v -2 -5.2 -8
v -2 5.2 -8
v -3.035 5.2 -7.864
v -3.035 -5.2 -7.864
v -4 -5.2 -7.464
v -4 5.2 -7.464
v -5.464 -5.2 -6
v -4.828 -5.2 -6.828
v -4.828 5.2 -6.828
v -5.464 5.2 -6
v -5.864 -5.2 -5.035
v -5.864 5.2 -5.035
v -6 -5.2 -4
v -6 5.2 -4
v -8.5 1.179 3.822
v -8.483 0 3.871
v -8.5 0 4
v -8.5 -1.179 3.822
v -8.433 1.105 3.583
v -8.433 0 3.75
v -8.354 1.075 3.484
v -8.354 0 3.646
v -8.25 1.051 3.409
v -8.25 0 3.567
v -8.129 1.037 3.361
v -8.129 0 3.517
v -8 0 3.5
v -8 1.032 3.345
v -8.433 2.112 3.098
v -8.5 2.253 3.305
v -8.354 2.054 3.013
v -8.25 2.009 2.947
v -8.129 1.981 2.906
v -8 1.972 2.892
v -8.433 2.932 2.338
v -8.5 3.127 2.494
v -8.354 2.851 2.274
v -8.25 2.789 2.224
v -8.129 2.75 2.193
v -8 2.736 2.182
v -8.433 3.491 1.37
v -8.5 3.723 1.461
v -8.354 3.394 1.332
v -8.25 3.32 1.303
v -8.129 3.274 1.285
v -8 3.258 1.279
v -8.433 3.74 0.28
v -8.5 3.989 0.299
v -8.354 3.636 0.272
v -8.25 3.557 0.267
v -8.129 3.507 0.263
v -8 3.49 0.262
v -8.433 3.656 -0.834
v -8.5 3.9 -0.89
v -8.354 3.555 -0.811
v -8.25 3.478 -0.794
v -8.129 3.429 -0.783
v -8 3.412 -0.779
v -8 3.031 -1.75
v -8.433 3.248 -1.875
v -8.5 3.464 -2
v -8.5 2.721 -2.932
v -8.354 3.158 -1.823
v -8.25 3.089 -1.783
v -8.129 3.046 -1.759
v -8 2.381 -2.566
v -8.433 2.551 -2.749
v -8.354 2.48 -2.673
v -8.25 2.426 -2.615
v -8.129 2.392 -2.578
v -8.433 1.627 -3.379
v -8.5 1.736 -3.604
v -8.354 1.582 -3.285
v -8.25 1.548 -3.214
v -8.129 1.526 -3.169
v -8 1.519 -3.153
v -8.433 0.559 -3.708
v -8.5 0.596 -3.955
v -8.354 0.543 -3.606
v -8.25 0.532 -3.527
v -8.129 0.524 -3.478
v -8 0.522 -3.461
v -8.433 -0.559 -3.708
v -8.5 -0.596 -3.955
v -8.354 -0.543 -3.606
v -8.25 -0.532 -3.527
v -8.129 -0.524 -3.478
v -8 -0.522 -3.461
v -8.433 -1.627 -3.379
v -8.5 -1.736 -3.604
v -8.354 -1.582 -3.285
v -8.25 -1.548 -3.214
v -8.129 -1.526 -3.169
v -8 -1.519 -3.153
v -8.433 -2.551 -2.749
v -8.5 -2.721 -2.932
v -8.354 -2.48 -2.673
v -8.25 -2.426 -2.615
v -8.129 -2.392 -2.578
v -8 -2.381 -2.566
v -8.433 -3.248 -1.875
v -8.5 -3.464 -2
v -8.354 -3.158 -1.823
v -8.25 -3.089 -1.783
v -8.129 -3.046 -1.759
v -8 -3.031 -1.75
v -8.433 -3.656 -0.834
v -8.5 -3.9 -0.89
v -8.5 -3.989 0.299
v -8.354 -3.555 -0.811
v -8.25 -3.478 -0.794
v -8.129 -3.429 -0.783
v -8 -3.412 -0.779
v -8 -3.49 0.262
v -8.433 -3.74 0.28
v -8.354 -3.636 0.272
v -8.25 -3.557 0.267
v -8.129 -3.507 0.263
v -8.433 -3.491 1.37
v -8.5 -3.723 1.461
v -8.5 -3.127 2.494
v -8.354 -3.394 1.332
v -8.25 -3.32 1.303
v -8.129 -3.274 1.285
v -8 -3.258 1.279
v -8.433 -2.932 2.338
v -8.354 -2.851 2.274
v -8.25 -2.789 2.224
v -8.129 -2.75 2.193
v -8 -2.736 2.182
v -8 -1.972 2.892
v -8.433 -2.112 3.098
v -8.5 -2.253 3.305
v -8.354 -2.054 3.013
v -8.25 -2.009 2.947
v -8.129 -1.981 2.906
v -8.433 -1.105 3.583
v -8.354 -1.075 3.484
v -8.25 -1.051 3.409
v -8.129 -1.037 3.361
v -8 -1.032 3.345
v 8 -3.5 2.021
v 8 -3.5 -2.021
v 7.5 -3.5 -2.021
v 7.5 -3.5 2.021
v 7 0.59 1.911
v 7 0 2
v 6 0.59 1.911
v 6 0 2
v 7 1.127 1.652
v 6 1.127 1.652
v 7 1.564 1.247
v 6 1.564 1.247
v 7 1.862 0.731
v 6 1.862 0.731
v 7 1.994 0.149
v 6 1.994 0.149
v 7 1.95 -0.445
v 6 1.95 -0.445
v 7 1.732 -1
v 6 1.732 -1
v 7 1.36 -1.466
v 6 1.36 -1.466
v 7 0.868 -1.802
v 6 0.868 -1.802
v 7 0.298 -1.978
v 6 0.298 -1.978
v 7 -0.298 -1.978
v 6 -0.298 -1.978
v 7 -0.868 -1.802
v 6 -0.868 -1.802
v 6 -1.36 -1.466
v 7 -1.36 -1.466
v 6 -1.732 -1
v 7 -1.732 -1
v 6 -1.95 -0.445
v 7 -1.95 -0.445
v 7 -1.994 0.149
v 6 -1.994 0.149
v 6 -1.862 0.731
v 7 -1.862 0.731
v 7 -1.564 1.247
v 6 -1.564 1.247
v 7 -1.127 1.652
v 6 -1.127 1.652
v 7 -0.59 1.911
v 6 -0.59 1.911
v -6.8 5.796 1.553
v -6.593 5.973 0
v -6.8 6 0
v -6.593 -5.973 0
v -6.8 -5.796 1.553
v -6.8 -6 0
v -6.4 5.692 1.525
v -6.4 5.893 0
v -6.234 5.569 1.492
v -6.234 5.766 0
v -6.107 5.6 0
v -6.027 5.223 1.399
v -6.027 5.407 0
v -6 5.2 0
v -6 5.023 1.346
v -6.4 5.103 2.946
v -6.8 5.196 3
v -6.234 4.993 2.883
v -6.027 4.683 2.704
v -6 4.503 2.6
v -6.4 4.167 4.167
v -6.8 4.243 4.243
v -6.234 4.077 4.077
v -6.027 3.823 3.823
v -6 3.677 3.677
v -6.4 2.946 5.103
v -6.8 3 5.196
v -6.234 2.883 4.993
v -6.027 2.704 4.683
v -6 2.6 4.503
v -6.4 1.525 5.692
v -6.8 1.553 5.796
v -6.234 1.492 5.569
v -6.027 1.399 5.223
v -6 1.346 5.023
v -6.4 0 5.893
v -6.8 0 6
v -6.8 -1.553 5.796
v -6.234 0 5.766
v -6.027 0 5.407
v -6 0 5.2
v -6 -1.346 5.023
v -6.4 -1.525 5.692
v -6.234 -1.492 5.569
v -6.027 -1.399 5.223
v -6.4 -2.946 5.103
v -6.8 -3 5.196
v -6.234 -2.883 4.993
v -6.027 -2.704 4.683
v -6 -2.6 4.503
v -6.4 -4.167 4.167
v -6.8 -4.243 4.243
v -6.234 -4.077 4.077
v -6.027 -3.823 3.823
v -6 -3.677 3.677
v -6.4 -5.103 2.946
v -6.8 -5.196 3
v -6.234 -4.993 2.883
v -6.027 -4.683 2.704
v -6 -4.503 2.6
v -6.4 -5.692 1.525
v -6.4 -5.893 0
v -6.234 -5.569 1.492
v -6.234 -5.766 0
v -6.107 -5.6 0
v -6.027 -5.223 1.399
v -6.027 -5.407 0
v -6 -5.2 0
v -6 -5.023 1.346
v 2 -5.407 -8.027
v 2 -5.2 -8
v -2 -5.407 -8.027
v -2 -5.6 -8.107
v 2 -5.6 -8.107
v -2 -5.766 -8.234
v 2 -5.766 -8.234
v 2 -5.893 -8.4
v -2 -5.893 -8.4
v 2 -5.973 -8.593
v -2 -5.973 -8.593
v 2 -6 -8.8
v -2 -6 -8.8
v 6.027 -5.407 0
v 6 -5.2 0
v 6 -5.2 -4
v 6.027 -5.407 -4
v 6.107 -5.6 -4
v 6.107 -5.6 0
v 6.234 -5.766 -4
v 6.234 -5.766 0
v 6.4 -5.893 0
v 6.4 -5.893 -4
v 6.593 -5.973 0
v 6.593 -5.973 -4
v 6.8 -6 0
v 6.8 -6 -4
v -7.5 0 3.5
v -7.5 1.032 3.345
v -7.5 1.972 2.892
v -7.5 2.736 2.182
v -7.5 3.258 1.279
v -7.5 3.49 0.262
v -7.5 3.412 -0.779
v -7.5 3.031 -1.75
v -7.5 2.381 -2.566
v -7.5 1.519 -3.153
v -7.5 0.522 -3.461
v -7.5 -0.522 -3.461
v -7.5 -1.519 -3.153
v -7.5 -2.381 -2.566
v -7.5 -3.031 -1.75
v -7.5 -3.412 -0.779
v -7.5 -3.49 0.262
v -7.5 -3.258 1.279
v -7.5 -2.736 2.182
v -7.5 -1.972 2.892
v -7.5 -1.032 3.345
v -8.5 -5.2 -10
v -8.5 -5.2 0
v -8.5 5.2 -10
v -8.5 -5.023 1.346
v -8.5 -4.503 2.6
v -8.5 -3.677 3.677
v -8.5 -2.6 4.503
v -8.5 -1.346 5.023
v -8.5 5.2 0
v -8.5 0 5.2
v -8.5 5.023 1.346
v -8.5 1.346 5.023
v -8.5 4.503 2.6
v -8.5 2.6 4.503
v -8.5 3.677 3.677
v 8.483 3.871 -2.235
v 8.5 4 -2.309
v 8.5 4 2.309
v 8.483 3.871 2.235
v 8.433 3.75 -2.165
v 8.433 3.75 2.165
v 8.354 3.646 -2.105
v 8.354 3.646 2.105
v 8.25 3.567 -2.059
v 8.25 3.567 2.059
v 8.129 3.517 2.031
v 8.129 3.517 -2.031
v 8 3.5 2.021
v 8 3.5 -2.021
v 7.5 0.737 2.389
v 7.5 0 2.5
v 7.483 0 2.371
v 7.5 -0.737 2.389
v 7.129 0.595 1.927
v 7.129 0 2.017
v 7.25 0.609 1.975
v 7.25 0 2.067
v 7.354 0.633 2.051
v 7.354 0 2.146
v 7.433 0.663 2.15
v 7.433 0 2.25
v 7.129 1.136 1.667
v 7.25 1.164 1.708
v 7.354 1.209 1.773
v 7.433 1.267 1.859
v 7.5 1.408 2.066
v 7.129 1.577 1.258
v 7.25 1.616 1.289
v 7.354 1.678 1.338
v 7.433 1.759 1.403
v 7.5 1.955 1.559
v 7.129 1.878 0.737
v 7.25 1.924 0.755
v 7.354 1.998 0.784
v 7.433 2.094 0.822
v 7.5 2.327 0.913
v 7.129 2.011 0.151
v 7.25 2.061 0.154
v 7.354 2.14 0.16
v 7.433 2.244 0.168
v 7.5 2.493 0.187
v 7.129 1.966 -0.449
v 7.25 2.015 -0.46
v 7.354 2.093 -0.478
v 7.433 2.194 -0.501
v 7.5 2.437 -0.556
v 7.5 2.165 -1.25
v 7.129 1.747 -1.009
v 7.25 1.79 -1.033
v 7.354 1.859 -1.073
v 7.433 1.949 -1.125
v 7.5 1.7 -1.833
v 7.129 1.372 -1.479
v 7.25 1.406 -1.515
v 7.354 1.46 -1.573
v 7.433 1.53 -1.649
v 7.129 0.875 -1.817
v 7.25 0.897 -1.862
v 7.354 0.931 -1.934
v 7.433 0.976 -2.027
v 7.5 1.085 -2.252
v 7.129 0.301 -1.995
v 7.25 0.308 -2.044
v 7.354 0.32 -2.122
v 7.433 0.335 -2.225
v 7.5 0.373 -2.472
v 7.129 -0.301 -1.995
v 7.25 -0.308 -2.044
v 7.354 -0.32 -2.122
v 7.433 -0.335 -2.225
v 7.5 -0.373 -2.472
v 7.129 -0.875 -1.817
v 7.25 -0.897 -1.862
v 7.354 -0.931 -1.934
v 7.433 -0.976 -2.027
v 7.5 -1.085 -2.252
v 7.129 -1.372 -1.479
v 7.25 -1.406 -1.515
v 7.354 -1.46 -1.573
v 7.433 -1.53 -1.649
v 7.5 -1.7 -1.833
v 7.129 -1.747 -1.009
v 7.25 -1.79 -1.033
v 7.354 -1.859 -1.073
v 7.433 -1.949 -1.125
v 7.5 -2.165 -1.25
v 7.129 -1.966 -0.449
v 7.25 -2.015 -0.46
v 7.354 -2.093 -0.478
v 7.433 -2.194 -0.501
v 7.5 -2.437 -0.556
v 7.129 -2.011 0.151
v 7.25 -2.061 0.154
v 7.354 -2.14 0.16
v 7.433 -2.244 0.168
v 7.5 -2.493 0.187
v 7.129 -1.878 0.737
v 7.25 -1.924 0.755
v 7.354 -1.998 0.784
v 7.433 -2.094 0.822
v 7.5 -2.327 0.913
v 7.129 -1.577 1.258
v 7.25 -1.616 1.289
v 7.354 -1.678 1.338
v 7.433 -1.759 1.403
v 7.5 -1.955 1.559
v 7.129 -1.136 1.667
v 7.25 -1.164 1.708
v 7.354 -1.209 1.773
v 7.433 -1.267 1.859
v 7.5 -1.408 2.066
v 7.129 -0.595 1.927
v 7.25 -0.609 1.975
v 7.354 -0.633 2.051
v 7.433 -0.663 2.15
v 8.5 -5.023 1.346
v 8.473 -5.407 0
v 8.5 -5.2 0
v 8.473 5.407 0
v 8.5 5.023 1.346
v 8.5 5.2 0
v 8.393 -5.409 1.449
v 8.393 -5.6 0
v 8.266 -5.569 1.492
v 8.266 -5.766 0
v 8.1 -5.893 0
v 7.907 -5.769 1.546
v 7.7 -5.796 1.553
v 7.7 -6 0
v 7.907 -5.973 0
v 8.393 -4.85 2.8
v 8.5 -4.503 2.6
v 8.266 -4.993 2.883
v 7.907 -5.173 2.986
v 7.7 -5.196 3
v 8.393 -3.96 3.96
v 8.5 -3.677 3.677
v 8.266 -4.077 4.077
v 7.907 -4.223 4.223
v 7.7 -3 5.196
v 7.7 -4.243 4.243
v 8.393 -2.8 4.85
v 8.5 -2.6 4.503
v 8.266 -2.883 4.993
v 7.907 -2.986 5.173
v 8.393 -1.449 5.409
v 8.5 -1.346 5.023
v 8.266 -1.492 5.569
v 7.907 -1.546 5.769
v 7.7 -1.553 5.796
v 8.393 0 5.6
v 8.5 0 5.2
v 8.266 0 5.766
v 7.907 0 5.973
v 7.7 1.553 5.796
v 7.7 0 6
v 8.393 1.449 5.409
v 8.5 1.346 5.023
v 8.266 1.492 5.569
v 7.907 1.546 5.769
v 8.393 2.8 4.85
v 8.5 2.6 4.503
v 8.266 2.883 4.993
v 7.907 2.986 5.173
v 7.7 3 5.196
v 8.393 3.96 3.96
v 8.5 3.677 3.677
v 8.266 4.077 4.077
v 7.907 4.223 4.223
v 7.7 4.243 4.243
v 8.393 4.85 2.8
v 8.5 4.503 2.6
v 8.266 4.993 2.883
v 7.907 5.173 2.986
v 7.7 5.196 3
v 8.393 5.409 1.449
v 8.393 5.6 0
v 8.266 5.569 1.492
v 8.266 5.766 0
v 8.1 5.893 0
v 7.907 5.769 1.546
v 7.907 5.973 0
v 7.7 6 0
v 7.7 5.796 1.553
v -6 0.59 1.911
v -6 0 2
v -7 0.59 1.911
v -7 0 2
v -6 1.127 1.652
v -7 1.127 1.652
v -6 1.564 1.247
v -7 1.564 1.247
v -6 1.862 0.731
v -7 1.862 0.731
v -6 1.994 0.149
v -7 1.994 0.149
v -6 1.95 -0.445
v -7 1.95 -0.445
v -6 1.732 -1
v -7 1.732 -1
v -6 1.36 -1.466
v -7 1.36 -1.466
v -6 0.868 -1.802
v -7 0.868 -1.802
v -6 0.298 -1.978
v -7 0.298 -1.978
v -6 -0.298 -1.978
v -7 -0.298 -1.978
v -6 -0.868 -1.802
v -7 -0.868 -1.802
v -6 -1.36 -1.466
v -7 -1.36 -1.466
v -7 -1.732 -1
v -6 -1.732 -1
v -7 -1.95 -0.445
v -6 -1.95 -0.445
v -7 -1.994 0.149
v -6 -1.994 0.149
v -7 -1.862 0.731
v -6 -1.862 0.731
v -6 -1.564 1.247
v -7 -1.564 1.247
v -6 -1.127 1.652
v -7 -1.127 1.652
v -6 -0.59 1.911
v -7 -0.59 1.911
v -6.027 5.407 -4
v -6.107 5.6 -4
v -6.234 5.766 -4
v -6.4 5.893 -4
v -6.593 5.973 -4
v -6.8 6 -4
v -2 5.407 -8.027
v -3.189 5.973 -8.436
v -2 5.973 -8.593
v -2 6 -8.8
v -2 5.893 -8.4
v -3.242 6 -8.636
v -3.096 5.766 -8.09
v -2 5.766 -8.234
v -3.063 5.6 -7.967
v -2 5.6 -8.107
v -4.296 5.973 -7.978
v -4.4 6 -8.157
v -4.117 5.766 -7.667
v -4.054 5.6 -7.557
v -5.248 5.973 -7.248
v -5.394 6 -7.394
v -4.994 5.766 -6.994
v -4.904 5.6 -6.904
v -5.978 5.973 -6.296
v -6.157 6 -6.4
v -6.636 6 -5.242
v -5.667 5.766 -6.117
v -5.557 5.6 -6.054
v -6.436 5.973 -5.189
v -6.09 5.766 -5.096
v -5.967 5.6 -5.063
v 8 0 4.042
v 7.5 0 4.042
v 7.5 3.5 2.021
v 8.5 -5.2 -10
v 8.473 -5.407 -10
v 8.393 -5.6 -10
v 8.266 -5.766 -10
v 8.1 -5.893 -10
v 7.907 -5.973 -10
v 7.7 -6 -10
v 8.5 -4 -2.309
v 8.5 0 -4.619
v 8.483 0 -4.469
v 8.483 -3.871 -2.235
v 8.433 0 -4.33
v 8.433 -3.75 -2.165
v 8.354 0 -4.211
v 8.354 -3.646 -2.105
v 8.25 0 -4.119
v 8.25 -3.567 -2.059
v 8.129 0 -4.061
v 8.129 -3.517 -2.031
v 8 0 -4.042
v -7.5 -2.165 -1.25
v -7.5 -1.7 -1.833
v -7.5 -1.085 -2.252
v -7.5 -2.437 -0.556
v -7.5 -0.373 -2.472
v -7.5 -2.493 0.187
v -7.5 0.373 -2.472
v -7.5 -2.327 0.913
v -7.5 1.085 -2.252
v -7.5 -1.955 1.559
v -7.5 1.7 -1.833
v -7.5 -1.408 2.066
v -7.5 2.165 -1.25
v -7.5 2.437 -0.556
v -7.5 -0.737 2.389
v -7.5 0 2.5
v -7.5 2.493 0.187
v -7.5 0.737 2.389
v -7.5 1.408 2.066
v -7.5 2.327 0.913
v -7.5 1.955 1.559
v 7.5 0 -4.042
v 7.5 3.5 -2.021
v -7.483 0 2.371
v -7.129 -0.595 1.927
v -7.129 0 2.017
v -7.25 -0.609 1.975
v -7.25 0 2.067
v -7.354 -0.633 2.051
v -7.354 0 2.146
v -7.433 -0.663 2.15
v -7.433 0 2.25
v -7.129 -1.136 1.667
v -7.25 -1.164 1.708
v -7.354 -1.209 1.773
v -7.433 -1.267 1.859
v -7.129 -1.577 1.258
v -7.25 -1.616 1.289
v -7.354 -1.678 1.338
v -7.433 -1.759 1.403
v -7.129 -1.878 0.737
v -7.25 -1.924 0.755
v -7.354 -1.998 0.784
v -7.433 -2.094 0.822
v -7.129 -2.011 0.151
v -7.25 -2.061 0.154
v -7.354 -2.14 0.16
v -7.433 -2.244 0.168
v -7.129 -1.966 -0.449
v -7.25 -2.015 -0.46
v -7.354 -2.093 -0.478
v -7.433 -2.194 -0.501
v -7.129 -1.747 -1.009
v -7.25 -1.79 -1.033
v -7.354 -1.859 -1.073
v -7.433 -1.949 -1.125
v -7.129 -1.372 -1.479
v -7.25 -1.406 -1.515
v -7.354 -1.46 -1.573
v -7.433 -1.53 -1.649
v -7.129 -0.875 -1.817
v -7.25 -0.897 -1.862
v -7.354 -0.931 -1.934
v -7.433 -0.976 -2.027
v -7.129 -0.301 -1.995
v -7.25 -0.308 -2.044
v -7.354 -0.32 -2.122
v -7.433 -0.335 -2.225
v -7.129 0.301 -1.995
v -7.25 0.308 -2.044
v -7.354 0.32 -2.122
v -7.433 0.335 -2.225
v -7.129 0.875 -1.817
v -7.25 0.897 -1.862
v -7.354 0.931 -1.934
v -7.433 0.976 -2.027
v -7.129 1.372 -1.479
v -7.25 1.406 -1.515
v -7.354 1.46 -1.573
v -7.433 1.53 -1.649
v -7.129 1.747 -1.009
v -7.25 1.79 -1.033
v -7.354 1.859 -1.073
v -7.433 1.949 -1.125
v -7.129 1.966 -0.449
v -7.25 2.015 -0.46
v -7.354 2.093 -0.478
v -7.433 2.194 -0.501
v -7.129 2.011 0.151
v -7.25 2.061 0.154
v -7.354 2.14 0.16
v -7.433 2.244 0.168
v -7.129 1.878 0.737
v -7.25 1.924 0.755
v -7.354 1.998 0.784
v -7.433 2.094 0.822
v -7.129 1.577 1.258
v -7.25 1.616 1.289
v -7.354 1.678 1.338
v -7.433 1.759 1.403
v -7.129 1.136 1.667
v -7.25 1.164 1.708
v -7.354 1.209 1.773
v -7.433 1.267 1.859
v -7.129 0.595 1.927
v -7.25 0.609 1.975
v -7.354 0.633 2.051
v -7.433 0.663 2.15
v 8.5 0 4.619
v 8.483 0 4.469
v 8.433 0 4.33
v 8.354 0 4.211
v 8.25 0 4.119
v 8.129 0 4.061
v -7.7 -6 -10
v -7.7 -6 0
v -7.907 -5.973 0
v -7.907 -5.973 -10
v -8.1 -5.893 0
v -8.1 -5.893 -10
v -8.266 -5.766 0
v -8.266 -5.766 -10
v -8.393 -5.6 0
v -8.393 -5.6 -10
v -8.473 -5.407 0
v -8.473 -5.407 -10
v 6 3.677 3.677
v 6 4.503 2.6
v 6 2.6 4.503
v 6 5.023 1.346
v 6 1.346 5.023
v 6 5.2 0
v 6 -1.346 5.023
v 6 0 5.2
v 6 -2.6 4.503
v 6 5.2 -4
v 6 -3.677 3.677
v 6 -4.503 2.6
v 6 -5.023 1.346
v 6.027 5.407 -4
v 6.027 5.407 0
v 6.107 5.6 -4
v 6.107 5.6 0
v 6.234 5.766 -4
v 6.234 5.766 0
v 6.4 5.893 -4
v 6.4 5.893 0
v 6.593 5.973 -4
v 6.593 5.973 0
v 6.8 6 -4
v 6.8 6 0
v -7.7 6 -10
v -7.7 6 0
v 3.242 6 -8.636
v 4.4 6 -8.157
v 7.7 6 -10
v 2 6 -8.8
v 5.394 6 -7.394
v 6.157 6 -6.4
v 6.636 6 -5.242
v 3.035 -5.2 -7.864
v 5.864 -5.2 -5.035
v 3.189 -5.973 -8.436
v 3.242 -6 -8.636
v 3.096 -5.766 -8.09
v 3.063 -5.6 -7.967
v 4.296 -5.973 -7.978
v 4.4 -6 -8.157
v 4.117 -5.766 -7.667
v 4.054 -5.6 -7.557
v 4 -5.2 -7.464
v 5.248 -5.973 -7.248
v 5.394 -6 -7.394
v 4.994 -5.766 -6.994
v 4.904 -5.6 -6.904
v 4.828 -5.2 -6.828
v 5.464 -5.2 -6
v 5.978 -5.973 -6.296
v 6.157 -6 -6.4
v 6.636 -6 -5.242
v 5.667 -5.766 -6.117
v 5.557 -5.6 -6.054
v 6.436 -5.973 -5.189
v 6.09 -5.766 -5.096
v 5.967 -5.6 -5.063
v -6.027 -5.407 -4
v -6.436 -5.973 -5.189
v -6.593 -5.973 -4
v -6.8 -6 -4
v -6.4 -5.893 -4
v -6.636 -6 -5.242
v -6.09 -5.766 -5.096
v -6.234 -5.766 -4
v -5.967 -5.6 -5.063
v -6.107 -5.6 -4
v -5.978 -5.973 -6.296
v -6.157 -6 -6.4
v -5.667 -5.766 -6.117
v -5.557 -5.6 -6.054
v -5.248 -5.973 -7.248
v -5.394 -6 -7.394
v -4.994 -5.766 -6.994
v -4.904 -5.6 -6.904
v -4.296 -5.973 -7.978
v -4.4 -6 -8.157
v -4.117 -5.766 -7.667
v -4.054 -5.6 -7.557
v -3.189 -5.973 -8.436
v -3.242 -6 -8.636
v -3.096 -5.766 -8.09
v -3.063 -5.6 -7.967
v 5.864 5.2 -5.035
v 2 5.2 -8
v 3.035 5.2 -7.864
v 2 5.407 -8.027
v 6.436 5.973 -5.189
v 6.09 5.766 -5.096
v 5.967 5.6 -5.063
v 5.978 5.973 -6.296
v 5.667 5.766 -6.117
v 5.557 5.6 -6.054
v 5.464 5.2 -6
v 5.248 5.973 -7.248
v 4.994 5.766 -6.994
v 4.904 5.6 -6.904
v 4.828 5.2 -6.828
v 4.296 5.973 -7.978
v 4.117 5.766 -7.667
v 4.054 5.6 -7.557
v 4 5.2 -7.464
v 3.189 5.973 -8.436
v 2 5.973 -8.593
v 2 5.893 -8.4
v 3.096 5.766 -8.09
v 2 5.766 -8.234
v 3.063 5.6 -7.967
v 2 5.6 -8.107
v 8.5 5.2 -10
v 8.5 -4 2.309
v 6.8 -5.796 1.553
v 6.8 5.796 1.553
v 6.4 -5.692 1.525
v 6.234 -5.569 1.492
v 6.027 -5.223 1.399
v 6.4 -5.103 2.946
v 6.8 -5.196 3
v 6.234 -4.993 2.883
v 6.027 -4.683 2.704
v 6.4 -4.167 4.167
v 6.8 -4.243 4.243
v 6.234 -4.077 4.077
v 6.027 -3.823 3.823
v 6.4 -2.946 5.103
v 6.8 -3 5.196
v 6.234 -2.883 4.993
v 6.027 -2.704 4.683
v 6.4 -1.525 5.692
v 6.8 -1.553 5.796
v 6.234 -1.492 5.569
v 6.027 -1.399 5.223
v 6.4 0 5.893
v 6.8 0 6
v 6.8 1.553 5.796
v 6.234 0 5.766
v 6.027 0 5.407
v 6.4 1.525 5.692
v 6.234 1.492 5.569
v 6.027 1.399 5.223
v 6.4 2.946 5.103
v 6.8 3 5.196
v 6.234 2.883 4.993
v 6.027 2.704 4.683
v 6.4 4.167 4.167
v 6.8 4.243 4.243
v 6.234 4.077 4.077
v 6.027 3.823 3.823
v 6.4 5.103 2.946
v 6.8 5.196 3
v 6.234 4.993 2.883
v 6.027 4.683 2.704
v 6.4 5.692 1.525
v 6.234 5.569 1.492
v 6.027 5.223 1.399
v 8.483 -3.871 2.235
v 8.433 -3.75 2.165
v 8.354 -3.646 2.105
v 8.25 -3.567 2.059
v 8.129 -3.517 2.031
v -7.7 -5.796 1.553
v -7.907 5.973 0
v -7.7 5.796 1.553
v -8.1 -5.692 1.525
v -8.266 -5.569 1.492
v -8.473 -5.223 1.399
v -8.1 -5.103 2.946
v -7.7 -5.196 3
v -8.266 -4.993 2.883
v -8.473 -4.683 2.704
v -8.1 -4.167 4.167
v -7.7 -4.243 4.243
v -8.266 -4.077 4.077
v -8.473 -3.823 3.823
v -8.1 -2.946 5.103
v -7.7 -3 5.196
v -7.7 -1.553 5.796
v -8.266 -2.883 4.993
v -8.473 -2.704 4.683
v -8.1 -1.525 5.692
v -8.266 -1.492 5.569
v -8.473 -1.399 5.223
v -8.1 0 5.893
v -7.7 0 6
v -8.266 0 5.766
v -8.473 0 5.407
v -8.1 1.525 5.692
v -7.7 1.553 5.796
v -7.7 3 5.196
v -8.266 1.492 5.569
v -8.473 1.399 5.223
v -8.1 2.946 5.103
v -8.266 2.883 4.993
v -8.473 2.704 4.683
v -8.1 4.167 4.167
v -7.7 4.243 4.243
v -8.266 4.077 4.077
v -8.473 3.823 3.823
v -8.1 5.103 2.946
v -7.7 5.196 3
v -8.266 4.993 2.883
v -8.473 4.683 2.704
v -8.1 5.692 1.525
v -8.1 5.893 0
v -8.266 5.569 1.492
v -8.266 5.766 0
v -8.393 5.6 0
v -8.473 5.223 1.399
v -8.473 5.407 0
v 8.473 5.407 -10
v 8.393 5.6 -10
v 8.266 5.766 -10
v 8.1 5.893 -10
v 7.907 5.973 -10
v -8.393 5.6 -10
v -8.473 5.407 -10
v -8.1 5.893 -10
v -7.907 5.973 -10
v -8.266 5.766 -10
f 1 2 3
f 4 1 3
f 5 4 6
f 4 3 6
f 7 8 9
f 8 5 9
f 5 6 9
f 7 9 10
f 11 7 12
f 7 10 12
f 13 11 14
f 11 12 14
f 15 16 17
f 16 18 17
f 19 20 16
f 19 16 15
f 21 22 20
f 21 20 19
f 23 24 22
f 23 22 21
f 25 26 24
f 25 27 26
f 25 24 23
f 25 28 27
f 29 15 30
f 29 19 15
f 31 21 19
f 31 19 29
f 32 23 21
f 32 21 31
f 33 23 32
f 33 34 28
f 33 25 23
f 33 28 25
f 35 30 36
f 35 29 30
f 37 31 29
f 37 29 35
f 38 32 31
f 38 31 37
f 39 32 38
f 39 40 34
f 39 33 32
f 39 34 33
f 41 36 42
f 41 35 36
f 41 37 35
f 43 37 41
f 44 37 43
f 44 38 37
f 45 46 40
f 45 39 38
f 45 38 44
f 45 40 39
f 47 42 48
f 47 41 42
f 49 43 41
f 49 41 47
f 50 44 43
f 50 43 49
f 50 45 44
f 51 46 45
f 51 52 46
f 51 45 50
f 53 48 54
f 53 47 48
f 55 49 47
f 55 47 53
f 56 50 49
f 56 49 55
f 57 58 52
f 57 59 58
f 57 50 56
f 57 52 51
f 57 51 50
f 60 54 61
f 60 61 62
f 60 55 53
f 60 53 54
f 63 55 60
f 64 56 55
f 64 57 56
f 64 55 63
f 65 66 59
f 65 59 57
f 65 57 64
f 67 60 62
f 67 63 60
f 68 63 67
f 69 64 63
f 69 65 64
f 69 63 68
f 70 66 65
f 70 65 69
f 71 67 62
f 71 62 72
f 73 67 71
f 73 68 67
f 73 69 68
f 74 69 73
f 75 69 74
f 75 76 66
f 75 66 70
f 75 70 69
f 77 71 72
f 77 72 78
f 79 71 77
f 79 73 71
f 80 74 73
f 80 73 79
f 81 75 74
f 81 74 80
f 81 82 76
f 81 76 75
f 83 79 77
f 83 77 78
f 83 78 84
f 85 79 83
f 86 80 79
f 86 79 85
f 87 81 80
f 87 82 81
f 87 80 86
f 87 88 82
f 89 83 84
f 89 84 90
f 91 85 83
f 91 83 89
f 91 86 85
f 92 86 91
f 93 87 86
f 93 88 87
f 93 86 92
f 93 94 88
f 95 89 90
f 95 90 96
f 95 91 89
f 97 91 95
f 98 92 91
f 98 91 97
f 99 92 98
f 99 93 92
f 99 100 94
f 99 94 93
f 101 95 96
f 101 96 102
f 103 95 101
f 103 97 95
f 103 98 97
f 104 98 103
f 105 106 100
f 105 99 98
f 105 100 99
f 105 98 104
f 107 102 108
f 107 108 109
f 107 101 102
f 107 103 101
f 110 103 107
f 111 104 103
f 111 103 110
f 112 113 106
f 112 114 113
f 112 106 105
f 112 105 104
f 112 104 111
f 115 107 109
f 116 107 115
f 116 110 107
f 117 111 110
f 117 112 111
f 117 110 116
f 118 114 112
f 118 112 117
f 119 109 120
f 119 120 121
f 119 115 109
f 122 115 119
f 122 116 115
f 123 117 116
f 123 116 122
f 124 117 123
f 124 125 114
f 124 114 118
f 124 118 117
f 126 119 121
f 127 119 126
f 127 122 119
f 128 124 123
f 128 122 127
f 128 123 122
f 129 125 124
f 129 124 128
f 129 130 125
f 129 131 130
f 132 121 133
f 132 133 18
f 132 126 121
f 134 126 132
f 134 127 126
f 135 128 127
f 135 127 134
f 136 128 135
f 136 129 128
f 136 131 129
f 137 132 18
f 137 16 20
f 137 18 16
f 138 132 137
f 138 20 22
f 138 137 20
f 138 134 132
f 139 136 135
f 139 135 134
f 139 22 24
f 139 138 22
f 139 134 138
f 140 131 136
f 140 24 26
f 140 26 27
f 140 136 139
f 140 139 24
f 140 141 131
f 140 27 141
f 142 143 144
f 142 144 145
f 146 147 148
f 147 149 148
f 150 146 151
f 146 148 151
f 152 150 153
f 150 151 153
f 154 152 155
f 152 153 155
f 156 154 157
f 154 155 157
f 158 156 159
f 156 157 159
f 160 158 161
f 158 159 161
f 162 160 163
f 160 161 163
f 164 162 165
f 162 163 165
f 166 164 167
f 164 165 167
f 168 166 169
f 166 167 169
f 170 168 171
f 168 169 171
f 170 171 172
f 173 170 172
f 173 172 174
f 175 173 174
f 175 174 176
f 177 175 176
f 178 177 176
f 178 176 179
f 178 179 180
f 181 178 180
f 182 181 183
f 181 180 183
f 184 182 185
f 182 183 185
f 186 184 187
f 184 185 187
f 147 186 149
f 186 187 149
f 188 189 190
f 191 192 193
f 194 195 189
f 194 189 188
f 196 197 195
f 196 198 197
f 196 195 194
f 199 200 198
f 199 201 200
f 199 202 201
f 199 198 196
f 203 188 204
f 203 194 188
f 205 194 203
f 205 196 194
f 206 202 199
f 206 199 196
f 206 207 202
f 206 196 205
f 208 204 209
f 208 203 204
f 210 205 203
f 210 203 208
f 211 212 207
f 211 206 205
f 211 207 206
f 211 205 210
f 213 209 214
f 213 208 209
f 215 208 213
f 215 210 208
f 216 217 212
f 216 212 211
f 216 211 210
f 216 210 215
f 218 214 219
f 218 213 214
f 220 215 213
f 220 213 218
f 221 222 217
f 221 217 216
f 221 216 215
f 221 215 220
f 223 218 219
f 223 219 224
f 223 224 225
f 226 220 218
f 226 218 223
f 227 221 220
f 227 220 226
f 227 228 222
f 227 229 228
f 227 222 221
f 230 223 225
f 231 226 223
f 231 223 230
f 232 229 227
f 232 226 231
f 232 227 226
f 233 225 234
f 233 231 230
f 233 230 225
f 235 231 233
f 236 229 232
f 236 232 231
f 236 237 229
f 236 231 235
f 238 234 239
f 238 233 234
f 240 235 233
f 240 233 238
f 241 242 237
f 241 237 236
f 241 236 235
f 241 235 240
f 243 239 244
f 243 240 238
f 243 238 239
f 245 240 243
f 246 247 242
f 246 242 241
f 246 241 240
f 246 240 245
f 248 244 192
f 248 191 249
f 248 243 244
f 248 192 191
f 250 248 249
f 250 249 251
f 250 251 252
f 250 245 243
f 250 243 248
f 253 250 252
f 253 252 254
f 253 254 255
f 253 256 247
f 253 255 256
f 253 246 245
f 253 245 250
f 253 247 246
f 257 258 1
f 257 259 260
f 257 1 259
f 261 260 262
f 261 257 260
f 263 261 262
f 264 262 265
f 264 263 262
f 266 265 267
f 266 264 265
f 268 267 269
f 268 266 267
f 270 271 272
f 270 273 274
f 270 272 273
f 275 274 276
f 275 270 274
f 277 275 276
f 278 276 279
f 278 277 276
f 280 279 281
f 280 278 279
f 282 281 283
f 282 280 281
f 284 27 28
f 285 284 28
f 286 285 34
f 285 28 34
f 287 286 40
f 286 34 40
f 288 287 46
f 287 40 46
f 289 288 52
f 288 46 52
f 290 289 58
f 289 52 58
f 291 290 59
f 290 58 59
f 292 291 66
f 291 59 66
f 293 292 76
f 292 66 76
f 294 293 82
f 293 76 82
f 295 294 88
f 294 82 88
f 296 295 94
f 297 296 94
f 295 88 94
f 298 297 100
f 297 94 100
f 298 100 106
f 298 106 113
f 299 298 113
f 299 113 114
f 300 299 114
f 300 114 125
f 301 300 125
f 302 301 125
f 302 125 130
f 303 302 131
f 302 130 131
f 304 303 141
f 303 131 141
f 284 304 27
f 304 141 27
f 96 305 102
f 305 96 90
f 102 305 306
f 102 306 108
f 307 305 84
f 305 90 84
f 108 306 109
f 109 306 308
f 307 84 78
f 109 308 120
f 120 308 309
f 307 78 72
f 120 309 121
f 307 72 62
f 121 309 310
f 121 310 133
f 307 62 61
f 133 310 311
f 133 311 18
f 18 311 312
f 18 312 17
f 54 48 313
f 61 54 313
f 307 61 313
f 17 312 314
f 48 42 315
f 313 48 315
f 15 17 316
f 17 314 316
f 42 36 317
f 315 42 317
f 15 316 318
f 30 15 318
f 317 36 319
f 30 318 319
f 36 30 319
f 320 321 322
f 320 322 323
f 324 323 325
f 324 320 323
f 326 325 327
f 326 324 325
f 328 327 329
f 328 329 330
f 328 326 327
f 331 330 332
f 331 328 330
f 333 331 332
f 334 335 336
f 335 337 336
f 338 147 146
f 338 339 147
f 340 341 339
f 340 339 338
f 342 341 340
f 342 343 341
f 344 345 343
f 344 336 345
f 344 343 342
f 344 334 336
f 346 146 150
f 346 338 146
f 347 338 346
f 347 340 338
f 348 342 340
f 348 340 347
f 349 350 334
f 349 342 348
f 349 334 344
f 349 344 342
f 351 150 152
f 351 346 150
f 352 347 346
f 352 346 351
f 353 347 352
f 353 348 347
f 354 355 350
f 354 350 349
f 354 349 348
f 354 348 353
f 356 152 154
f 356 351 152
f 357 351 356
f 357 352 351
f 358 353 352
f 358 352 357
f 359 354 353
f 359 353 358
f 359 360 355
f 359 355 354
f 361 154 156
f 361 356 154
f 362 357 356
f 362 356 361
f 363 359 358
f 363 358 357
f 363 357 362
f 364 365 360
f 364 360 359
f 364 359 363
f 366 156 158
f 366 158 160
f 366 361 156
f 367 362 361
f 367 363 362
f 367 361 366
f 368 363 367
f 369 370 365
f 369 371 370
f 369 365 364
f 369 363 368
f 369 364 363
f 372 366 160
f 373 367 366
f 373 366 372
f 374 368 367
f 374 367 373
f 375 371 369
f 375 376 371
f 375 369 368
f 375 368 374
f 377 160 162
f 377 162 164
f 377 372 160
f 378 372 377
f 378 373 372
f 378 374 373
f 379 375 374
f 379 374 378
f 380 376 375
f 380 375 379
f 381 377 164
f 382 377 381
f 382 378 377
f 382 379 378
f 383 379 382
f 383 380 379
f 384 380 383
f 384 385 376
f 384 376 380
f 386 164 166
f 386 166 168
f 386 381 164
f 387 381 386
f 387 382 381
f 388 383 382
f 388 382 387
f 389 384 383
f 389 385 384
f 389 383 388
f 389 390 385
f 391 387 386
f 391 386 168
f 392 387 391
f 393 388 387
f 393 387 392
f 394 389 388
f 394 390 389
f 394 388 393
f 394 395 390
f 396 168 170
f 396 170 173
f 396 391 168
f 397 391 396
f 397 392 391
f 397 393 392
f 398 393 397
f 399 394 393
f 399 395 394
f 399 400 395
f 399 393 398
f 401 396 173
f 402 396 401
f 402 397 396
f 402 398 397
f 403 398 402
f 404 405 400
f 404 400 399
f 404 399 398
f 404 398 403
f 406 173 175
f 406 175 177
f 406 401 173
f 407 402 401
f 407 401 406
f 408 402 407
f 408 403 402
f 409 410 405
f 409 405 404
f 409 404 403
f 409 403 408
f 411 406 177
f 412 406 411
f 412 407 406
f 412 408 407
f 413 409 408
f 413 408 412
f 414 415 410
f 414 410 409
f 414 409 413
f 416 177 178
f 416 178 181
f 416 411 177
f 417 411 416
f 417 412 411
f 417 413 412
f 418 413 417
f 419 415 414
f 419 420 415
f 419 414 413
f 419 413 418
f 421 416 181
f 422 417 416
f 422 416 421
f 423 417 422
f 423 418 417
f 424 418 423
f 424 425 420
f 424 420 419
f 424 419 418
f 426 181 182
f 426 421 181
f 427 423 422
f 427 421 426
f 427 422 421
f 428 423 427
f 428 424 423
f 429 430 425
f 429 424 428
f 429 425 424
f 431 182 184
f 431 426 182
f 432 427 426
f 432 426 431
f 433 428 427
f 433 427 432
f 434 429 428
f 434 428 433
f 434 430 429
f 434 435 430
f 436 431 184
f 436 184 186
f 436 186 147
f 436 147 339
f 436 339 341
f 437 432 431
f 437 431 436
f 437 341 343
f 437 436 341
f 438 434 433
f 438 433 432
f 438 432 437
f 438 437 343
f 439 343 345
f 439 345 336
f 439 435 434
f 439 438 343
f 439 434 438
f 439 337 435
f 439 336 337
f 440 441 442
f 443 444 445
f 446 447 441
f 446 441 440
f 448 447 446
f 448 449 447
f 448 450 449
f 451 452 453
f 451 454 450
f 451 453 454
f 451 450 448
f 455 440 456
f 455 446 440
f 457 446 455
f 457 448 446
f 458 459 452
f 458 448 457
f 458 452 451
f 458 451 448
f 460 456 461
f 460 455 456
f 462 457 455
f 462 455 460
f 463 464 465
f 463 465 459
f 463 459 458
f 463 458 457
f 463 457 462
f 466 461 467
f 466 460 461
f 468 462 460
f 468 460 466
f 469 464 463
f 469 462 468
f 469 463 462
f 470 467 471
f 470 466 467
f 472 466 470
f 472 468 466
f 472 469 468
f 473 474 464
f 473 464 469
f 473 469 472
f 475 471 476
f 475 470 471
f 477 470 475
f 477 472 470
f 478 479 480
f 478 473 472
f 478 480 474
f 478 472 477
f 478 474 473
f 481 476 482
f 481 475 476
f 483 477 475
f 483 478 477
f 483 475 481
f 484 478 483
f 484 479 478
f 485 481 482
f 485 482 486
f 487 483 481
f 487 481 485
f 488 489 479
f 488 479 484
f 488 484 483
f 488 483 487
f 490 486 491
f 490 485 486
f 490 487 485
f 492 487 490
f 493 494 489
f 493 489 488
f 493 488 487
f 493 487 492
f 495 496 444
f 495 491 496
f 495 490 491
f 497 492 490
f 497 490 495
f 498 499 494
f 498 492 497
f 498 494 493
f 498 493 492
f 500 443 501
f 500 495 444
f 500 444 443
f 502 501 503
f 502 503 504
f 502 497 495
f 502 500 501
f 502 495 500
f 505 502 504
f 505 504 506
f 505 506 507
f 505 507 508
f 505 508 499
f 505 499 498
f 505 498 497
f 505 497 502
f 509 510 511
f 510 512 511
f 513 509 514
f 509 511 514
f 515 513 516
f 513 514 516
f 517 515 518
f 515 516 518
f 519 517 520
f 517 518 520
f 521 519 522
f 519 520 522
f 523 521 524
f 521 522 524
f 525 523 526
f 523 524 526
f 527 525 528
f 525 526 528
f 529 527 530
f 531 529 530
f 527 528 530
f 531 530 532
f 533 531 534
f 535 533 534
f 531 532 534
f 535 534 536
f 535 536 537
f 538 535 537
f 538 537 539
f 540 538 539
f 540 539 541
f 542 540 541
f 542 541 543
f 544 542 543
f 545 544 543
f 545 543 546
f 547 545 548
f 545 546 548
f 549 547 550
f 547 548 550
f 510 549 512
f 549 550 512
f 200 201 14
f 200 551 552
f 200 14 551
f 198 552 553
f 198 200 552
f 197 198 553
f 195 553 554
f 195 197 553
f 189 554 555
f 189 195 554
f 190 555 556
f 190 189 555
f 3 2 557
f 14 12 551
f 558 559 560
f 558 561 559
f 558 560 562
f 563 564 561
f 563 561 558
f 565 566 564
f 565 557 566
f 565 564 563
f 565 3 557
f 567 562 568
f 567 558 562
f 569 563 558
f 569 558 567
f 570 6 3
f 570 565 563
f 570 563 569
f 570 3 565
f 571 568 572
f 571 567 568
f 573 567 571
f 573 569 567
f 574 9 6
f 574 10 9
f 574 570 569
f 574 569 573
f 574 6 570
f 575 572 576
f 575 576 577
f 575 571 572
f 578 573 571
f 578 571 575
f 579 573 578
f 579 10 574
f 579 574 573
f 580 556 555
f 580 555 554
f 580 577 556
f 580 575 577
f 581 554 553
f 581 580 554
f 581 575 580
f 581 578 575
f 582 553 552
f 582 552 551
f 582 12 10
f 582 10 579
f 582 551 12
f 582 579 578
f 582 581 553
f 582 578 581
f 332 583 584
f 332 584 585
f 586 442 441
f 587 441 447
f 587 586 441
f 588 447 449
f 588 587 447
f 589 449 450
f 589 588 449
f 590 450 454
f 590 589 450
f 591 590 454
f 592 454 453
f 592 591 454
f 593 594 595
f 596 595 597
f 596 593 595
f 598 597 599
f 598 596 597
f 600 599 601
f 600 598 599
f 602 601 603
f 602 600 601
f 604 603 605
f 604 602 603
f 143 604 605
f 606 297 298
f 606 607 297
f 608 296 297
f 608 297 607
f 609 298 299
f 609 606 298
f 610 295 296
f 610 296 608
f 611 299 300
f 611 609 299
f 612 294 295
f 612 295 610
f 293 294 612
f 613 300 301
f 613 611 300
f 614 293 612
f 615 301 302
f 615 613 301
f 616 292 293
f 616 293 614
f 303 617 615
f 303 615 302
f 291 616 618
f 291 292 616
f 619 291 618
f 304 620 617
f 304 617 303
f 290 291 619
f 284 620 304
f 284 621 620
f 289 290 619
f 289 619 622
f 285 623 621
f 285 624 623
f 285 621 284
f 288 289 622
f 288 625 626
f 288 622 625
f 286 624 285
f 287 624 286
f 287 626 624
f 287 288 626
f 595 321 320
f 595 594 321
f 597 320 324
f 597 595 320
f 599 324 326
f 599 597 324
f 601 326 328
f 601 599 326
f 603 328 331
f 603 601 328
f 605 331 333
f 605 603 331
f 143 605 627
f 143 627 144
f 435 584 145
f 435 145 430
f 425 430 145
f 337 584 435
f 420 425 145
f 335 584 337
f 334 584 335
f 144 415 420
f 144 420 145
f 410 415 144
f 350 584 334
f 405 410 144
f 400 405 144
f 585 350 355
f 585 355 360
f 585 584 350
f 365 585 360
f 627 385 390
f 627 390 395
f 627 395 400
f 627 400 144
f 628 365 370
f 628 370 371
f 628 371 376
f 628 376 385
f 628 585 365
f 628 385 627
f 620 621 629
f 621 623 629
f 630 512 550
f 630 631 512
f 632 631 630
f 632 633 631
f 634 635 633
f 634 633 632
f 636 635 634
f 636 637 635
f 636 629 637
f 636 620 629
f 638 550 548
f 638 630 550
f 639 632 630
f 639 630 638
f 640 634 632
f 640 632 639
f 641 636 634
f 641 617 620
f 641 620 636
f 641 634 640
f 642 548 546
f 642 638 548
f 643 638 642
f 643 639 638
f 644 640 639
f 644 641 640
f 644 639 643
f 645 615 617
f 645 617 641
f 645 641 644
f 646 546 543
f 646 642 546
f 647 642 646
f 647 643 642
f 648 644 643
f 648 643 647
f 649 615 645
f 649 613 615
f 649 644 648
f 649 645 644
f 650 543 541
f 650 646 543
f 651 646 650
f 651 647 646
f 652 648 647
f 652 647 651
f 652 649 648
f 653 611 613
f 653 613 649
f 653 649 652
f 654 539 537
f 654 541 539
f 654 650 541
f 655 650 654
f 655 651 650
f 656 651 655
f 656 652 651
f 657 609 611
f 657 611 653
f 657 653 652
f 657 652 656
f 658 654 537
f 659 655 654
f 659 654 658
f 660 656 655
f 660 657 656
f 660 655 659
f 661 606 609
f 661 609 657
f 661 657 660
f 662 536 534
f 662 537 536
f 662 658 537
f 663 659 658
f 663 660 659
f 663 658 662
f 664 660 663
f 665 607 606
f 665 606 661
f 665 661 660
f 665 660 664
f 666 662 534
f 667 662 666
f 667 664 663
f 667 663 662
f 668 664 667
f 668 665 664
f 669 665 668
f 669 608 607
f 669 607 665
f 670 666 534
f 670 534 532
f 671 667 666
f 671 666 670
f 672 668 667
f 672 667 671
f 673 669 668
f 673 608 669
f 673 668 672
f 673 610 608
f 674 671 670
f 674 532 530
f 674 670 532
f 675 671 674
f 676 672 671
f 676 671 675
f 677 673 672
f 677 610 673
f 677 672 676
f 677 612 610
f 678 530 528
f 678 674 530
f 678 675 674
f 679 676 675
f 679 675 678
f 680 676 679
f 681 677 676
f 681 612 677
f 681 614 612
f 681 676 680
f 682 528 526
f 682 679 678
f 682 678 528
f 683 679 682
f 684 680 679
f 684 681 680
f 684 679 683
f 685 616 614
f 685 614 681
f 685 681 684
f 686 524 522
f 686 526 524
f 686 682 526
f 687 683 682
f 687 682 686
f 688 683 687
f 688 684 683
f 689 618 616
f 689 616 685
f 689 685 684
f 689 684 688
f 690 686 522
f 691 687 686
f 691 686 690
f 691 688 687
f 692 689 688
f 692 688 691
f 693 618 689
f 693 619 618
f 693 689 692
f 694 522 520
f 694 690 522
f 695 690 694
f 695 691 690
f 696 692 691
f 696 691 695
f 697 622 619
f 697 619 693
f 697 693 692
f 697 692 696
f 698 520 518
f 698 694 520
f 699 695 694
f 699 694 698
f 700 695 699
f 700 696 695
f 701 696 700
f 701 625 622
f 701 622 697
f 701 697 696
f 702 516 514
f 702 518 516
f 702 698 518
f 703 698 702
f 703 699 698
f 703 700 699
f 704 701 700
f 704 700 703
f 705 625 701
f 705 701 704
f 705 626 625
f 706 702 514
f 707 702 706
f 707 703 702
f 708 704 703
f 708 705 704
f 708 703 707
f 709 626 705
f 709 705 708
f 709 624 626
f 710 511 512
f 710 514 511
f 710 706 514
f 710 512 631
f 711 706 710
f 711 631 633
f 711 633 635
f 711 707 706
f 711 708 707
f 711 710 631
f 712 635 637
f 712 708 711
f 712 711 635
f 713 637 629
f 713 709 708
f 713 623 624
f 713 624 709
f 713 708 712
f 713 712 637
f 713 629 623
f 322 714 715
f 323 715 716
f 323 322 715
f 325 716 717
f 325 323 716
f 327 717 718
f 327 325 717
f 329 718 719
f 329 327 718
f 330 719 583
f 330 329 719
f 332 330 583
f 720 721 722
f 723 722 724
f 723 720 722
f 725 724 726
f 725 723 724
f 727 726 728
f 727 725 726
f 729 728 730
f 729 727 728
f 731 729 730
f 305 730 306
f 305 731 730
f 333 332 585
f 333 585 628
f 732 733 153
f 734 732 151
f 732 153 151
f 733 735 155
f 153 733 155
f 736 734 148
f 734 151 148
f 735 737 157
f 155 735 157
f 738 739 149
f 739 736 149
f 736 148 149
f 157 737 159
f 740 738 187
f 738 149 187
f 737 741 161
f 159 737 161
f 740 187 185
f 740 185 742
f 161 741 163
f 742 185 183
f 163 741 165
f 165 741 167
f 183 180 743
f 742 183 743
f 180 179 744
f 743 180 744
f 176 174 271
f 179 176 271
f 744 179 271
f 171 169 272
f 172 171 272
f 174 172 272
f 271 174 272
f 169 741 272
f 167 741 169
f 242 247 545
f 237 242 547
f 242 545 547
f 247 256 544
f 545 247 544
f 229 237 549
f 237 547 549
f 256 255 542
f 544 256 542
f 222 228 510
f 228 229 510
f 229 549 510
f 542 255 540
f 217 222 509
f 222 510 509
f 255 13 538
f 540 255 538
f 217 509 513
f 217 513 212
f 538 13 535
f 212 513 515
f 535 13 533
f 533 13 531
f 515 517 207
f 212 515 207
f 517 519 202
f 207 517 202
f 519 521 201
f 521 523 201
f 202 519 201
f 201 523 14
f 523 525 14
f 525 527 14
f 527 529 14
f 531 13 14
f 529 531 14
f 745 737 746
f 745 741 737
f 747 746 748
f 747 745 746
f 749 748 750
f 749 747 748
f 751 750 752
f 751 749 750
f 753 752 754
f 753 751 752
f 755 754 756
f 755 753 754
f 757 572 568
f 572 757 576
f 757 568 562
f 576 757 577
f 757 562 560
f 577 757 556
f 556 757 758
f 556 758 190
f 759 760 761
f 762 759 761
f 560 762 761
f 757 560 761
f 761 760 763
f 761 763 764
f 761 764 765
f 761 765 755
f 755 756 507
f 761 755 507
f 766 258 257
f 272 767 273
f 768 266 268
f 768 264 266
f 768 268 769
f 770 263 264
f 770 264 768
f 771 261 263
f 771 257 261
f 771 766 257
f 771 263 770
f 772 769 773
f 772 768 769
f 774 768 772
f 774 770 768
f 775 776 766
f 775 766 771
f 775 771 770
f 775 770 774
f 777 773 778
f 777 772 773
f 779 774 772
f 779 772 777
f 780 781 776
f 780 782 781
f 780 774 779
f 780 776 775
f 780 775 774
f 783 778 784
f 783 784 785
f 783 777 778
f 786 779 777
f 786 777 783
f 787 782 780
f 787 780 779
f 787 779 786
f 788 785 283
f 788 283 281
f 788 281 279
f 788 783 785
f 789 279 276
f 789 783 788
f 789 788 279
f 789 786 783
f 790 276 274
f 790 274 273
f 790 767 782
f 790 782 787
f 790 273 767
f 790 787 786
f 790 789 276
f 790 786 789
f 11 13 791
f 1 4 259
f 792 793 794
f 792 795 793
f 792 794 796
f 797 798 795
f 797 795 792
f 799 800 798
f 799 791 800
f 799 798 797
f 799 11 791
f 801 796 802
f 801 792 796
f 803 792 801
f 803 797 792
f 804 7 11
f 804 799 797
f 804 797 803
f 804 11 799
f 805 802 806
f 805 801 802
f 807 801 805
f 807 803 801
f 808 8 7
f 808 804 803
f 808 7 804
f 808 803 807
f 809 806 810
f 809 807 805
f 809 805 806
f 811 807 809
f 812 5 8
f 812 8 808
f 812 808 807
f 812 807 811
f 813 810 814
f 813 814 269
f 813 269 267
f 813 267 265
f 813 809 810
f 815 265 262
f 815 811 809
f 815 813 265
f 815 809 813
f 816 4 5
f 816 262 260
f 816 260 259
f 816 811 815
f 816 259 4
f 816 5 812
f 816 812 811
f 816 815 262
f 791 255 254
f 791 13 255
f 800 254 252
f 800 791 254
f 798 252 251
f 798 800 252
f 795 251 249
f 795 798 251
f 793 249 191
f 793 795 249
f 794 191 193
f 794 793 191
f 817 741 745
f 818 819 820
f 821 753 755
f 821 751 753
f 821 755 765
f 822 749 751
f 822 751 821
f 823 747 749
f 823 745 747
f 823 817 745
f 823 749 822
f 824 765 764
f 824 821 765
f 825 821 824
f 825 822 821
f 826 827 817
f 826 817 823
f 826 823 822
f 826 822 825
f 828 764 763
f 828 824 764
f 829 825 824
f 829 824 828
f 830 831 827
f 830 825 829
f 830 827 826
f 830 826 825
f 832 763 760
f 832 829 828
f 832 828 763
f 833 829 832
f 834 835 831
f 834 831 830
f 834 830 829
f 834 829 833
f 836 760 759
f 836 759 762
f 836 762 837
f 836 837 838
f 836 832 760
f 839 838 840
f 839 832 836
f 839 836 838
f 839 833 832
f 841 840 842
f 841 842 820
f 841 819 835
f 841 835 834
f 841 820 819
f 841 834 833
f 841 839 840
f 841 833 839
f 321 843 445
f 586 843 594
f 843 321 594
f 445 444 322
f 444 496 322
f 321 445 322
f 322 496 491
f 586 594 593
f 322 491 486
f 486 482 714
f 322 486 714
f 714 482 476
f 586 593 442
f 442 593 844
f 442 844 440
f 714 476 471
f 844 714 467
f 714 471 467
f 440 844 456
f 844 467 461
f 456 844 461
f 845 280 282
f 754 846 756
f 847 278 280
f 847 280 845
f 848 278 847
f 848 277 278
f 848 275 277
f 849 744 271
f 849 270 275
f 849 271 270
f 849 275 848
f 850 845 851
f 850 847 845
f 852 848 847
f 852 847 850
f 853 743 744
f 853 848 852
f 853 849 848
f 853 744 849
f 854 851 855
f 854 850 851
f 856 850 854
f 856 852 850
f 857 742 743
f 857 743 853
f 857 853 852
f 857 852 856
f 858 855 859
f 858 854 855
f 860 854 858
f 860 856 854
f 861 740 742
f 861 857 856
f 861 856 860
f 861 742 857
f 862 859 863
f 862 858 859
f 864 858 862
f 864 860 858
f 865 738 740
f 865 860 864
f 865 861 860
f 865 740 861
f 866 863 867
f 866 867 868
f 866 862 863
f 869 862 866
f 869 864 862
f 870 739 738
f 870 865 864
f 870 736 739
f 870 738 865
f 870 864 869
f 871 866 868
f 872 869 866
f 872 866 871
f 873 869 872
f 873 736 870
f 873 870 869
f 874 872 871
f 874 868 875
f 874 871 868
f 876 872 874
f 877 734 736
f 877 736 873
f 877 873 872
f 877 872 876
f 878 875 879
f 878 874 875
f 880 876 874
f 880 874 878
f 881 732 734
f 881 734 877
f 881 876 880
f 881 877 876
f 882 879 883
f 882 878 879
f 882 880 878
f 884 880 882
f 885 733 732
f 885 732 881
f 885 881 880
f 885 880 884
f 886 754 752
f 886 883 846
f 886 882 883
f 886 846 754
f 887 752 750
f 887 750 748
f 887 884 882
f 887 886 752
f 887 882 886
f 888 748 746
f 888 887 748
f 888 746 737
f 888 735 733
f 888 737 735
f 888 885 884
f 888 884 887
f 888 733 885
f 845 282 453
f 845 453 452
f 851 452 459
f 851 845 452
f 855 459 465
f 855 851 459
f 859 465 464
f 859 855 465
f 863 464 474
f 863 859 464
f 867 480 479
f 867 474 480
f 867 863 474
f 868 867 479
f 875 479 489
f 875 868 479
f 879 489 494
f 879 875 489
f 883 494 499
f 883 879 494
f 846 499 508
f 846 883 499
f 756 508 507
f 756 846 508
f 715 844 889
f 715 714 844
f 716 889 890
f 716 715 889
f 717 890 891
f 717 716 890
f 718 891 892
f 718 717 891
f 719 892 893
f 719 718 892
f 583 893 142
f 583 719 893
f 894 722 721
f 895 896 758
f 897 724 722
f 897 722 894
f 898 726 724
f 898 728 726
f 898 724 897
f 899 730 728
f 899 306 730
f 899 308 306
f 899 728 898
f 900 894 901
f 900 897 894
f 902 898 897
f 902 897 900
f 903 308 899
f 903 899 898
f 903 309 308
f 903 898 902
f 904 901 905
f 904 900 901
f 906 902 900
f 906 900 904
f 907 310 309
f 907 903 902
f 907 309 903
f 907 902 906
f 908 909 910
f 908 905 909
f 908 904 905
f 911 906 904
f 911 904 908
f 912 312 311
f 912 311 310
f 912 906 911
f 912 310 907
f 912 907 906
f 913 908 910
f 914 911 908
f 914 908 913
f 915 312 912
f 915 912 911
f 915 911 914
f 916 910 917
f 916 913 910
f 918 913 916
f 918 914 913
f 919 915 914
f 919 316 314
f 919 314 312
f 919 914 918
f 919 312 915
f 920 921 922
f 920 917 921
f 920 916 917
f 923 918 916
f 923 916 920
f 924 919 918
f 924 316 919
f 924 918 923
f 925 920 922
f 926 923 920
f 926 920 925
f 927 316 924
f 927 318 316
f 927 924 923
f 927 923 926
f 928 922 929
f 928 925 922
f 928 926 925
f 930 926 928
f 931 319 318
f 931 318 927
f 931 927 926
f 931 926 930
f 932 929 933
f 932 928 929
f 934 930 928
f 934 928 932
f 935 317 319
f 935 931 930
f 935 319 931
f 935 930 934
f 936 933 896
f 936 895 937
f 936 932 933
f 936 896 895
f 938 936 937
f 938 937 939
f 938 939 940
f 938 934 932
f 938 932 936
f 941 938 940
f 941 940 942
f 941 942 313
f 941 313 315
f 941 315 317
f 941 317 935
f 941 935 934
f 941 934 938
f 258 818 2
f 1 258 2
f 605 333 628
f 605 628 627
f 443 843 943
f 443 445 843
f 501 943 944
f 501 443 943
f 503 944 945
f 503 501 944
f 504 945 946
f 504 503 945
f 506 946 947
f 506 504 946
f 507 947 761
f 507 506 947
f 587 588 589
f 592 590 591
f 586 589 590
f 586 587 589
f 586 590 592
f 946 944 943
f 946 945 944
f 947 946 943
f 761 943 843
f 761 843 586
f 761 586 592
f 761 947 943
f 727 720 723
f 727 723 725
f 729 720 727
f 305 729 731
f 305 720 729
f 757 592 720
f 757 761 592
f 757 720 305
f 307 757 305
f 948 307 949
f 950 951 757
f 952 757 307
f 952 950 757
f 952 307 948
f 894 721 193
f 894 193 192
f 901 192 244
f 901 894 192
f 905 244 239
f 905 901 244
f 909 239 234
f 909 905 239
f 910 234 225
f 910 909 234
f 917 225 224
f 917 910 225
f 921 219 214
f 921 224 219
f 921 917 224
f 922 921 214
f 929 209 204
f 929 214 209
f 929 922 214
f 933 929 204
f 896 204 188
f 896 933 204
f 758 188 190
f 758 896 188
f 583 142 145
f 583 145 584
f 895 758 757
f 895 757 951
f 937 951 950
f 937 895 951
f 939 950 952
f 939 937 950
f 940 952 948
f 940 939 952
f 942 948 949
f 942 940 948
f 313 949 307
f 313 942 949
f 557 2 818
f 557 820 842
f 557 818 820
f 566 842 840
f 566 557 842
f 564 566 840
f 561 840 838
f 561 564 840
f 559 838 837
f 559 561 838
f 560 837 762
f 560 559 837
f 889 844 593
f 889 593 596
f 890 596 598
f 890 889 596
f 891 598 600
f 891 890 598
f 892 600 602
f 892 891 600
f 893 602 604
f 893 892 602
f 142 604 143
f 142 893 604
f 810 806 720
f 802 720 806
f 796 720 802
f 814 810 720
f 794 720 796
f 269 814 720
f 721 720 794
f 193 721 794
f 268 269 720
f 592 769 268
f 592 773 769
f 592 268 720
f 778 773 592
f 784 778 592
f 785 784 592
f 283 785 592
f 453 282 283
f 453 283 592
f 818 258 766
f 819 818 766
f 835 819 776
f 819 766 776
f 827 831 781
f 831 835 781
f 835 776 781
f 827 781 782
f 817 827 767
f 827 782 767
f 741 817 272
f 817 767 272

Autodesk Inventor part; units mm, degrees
ref_plane "YZ Plane" through (0, 0, 0) normal (1, 0, 0) x (0, 1, 0)
ref_plane "XZ Plane" through (0, 0, 0) normal (0, 1, 0) x (-1, 0, 0)
ref_plane "XY Plane" through (0, 0, 0) normal (0, 0, 1) x (1, 0, 0)
sketch "Sketch8" plane through (0, 0, 0) normal (0, 0, 1) x (1, 0, 0)
  line L0 (-6, 6) -> (-8.5, 6)
  line L1 (-8.5, 6) -> (-8.5, -6)
  line L2 (-8.5, -6) -> (-6, -6)
  line L3 (-6, -6) -> (-6, 6)
  line L4 (-6, 6) -> (-8.5, -6) construction
  line L5 (-8.5, 6) -> (-6, -6) construction
  line L6 (6, -6) -> (8.5, -6)
  line L7 (8.5, -6) -> (8.5, 6)
  line L8 (8.5, 6) -> (6, 6)
  line L9 (6, 6) -> (6, -6)
  line L10 (6, -6) -> (8.5, 6) construction
  line L11 (8.5, -6) -> (6, 6) construction
  line L12 (0, 8.4) -> (0, -8.4) projected
  line L13 (-11.9, 0) -> (11.9, 0) projected
  line L14 (-6, 6) -> (6, 6) construction
  line L15 (-6, -6) -> (6, -6) construction
  point P0 (0, 0)
  point P1 (-7.25, 0)
  point P2 (7.25, 0)
  dimension "d32" = 12
  dimension "d33" = 2.5
extrude "Extrusion1" add sketch "Sketch8" along normal blind 6 and the other way blind 8
sketch "Sketch9" plane through (-8.5, -6, 6) normal (-1, 0, 0) x (0, 0, 1)
  circle A0 centre (-6, 6) radius 6
  line L0 (0, 12) -> (0, 0) construction
  line L1 (0, 6) -> (-14, 6) construction
  line L2 (-14, 12) -> (-14, 0) construction
  line L3 (0, 12) -> (-14, 12) construction
  line L4 (-14, 12) -> (0, 12) projected
  line L5 (-6, 12) -> (0, 12)
  line L6 (0, 12) -> (0, 0)
  line L7 (0, 0) -> (-6, 0)
  line L8 (-14, 0) -> (0, 0) projected
extrude "Extrusion2" cut sketch "Sketch9" against normal through all contours L6 L7 A0 | A0 L4 L6
sketch "Sketch10" plane through (-8.5, -6, -8) normal (-1, 0, 0) x (0, 0, 1)
  line L0 (8, 6) -> (14, 6) construction
  arc A0 (8, 0) -> (8, 12) centre (8, 6) ccw construction
  line L1 (8, 6) -> (0, 6) construction
  line L2 (0, 12) -> (0, 0) construction
  circle A1 centre (8, 6) radius 2
  dimension "d41" = 4
extrude "Extrusion3" cut sketch "Sketch10" against normal through all
sketch "Sketch11" plane through (-8.5, -6, -8) normal (-1, 0, 0) x (0, 0, 1)
  circle A0 centre (8, 6) radius 3.5
  dimension "d44" = 7
extrude "Extrusion4" cut sketch "Sketch11" against normal blind 1
sketch "Sketch12" plane through (8.5, -6, -8) normal (1, 0, 0) x (0, 0, -1)
  line L0 (-3.9585, 6) -> (-5.9793, 2.5)
  line L1 (-5.9793, 2.5) -> (-10.0207, 2.5)
  line L2 (-10.0207, 2.5) -> (-12.0415, 6)
  line L3 (-12.0415, 6) -> (-10.0207, 9.5)
  line L4 (-10.0207, 9.5) -> (-5.9793, 9.5)
  line L5 (-5.9793, 9.5) -> (-3.9585, 6)
  line L6 (0, 6) -> (-14, 6) construction
  arc A0 (-8, 12) -> (-8, 0) centre (-8, 6) ccw construction
  line L7 (0, 12) -> (0, 0) construction
  dimension "d47" = 7
extrude "Extrusion5" cut sketch "Sketch12" against normal blind 1
sketch "Sketch13" plane through (0, 0, -8) normal (0, 0, -1) x (-1, 0, 0)
  line L0 (-8.5, 6) -> (-8.5, -6) projected
  line L1 (-6, 6) -> (-8.5, 6) projected
  line L2 (8.5, -6) -> (8.5, 6) projected
  line L3 (-8.5, 6) -> (8.5, 6)
  line L4 (8.5, 6) -> (8.5, -6)
  line L5 (8.5, -6) -> (-8.5, -6)
  line L6 (-8.5, -6) -> (-8.5, 6)
  point P0 (0, 0)
extrude "Extrusion6" add sketch "Sketch13" along normal blind 2
fillet "Fillet1" radius 4 2 edges at (-6, 0, -8) (6, 0, -8)
fillet "Fillet2" radius 0.8 13 edges at (6, 6, -2) (6, 0, 6) (6, -6, -2) (0, -6, -8) (-6, -6, -2) (-6, 0, 6) (-6, 6, -2) (-8.5, 6, -5) (-8.5, -6, -5) (-8.5, 0, 6) (8.5, -6, -5) (8.5, 6, -5) (8.5, 0, 6)
fillet "Fillet3" radius 0.5 1 edges at (7.5, 0, -2)
fillet "Fillet4" radius 0.5 1 edges at (-7.5, 0, -2)
fillet "Fillet5" radius 0.5 6 edges at (8.5, -1.75, 3.0311) (8.5, 1.75, 3.0311) (8.5, 3.5, 0) (8.5, 1.75, -3.0311) (8.5, -1.75, -3.0311) (8.5, -3.5, 0)
fillet "Fillet6" radius 0.5 1 edges at (-8.5, 0, -3.5)
equation "\"d32\" = bar_connector_bar_holder_width"
equation "\"d33\" = bar_connector_width"
equation "\"d35\" = bar_connector_length_from_screw_center_to_edge"
equation "\"d36\" = bar_connector_length_from_screw_center_to_box"
equation "\"d41\" = bar_holder_screw_diameter"
equation "\"d44\" = screw_head_diameter"
equation "\"d45\" = bar_connector_screw_depth"
equation "\"d47\" = nut_width"
equation "\"d48\" = bar_connector_screw_depth"
equation "\"d50\" = bar_holder_wall_thickness"
equation "\"bar_connector_width\" = 2.5"
equation "\"bar_connector_screw_depth\" = 1"
equation "\"bar_connector_bar_holder_width\" = bar_holder_bar_diameter + 2 * bar_holder_wall_thickness"
equation "\"bar_connector_length_from_screw_center_to_edge\" = 0.5 * bar_connector_bar_holder_width"
equation "\"bar_connector_length_from_screw_center_to_box\" = 8"
equation "\"bar_holder_screw_diameter\" = 4"
equation "\"screw_head_diameter\" = 7"
equation "\"nut_width\" = 7"
equation "\"bar_holder_wall_thickness\" = 2"
equation "\"bar_holder_bar_diameter\" = 8"
properties part number "board_box_holder" material "Thermoplastic Resin"
